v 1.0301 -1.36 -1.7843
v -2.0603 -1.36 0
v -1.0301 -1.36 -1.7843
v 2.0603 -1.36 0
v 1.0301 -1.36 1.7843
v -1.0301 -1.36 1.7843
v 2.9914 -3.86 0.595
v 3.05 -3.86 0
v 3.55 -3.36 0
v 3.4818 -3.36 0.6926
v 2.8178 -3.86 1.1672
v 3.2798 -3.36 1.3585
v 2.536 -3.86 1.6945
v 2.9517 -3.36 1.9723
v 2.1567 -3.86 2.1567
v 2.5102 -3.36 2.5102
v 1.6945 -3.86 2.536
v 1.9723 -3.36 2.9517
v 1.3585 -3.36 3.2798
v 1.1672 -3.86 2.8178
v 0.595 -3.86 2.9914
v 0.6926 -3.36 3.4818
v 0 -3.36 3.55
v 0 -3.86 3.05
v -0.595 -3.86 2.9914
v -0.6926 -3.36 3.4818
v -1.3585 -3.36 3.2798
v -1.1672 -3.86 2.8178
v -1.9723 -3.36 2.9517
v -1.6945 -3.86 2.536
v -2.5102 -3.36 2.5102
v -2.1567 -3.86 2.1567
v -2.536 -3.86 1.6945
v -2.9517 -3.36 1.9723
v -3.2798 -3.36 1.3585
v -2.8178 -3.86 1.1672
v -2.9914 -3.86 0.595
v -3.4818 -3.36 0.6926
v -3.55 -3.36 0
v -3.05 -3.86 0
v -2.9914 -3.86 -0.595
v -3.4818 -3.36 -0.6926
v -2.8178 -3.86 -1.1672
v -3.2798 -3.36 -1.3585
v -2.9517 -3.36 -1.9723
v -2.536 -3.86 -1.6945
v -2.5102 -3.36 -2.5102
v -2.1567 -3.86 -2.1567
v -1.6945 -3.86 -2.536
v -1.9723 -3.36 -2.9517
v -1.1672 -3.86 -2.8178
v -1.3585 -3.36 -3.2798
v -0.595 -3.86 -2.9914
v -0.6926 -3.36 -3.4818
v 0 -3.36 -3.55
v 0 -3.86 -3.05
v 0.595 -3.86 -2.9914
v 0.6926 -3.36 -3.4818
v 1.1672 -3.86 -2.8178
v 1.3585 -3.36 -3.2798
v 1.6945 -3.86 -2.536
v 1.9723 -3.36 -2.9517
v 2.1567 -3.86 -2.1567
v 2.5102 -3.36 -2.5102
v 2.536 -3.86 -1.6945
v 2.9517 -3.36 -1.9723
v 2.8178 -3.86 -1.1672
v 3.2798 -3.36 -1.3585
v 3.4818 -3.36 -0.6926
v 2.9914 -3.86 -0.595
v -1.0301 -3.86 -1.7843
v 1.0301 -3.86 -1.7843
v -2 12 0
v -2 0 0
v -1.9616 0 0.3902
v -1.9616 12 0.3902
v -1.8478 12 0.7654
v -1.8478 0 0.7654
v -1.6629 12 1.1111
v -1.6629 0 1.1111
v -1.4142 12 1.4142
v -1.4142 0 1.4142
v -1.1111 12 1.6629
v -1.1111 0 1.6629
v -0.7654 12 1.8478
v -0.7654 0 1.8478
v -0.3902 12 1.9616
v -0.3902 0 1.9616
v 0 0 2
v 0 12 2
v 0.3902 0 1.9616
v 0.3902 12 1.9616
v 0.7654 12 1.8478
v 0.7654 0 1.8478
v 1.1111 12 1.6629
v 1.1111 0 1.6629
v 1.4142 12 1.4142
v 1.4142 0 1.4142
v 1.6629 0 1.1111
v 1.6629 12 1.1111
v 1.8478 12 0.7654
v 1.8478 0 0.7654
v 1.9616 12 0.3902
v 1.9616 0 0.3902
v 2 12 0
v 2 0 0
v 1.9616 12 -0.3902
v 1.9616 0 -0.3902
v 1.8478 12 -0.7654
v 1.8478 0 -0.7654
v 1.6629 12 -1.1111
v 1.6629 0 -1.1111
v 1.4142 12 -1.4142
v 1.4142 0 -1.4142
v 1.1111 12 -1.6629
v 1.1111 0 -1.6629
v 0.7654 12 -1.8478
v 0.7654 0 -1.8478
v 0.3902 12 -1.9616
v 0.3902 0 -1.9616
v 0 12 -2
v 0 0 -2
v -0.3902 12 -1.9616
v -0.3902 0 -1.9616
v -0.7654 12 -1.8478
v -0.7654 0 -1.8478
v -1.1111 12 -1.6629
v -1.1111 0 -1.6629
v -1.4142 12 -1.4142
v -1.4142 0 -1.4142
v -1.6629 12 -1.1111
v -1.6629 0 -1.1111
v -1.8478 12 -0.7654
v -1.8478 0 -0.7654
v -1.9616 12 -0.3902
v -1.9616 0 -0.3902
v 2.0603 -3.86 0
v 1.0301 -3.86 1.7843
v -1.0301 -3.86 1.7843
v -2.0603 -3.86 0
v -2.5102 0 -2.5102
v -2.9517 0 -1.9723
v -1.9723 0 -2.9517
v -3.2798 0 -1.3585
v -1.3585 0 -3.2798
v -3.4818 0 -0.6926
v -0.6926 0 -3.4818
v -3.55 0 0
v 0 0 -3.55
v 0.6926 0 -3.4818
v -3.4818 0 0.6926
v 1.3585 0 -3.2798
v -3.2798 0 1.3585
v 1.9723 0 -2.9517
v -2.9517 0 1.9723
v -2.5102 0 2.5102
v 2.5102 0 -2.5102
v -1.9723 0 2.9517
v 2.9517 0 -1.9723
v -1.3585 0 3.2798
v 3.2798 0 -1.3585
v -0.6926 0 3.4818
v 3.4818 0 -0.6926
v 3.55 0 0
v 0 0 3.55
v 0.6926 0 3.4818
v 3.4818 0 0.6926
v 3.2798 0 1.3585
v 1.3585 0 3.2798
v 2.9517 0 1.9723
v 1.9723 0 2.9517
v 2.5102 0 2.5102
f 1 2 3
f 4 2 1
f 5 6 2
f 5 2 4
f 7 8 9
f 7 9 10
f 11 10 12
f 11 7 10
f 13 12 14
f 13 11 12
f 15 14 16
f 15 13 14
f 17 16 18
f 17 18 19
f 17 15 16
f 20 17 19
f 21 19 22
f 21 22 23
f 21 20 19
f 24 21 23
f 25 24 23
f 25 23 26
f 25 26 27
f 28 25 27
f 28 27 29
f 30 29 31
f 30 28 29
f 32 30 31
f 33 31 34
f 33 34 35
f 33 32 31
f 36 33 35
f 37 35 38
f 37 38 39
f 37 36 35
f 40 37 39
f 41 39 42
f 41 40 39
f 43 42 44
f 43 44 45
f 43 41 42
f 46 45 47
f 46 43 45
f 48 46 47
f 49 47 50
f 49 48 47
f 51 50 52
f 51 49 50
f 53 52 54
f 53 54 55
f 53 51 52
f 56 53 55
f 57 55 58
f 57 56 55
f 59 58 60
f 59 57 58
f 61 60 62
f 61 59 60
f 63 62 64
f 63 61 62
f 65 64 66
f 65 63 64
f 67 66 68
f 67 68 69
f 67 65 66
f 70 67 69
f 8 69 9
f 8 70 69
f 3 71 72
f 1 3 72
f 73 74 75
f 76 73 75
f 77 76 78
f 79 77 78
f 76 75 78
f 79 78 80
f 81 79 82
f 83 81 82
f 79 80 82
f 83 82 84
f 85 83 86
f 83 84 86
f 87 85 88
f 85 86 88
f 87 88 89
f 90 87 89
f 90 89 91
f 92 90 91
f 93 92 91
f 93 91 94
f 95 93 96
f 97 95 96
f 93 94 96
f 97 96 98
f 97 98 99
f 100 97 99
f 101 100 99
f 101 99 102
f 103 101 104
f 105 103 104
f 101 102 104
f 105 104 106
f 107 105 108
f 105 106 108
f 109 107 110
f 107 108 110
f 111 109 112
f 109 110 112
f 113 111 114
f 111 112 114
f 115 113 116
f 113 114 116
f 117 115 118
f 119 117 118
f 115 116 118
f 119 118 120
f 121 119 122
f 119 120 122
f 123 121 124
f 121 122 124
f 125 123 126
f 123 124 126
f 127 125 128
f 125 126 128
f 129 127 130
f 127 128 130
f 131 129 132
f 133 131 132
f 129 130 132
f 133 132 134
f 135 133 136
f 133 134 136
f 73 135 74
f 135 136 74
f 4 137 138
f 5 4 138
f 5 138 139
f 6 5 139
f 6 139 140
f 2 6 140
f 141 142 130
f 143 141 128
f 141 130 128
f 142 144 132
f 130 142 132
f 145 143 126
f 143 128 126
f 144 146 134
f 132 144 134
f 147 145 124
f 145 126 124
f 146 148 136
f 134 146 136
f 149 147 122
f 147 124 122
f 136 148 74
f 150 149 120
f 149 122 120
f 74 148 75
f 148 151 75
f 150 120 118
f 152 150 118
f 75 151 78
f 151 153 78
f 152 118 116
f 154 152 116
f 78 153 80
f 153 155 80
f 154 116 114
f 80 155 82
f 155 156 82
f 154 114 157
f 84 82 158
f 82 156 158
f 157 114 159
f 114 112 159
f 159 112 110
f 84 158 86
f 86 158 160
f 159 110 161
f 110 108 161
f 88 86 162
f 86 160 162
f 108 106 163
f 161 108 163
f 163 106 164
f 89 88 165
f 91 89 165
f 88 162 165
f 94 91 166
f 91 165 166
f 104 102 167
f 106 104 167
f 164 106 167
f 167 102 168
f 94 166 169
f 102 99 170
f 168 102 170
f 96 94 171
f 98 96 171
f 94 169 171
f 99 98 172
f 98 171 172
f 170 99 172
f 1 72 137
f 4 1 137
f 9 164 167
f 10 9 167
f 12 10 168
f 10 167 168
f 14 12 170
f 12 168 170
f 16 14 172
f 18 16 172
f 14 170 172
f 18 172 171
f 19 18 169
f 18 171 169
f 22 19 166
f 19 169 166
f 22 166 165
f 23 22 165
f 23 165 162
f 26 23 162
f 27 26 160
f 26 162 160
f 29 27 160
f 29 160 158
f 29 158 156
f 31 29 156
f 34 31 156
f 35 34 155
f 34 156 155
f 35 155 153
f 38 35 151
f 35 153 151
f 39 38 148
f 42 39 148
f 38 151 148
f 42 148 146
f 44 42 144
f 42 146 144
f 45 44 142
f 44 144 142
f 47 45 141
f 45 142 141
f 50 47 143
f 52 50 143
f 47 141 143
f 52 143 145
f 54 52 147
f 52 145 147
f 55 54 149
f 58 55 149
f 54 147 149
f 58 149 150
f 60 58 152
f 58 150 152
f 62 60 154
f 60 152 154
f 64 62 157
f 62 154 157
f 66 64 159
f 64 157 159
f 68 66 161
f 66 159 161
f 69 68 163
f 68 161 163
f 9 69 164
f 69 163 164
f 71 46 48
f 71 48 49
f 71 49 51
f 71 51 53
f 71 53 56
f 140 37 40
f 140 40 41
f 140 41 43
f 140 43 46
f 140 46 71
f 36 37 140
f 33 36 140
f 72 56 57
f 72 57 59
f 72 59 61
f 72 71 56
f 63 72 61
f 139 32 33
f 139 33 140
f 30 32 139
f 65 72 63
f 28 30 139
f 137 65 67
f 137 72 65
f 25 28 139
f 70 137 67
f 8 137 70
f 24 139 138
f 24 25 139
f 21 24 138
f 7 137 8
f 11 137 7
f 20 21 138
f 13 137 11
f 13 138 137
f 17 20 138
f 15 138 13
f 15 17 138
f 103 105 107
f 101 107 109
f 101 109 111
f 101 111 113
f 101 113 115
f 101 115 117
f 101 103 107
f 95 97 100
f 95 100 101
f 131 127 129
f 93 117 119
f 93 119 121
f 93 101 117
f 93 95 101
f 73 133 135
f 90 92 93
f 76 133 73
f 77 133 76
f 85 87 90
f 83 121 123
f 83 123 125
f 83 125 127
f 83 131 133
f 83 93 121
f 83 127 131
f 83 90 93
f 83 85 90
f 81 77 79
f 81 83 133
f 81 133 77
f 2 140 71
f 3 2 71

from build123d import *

# Parameters (mm, degrees)
F0_R     = 3.55
F1_DEPTH = 3.86
F3_DEPTH = 2.5
F4_R     = 2
F5_DEPTH = 12
F6_SIZE  = 0.5


with BuildPart() as f1:
    # F0 (on Front) → F1 (new body)
    with BuildSketch(Plane.XZ):
        Circle(F0_R)
    extrude(amount=F1_DEPTH)

    # F2 (on face) → F3 (cut)
    with BuildSketch(Plane.XZ.offset(3.86)):
        Polygon((-1.030145, -1.784263), (1.030145, -1.784263), (2.060289, 0), (1.030145, 1.784263), (-1.030145, 1.784263), (-2.060289, 0), align=None)
    extrude(amount=-F3_DEPTH, mode=Mode.SUBTRACT)

    # F4 (on face) → F5 (join)
    with BuildSketch(Plane(origin=(0, 0, 0), x_dir=(-1, 0, 0), z_dir=(0, 1, 0))):
        Circle(F4_R)
    extrude(amount=F5_DEPTH)

    # F6
    f6_edges = [f1.edges().sort_by_distance(p)[0] for p in [
        (-3.55, -3.86, 0),
    ]]
    chamfer(f6_edges, length=F6_SIZE)


solid = f1.part
